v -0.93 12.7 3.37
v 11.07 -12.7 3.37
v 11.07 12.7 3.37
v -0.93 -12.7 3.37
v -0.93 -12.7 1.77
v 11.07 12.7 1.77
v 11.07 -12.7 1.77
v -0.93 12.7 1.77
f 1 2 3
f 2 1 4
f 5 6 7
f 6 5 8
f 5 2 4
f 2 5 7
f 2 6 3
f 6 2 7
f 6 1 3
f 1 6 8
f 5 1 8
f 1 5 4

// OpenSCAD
// file: ../usb-c-port.scad
//-----------------------------------------------------------------------
// USB-C port through a wall, flush: the socket's metal shell sits in a
// close-fitting pocket in the wall, walled in on all four sides, its face
// level with the outside. The cable seats the way it does on a laptop.
//
// A board's socket only overhangs the board edge by a mm or so, less than
// the wall. So the board's end tucks into a shallow relief in the wall's
// inner face, the width of the board, leaving the wall round the socket
// thin enough for the face to reach the outside. When that would leave less
// than usbcMinWall (a socket that barely overhangs), the face sits back from
// the outside instead: usbcRecess() says how far.
//
// Modules, all in the same frame:
//   usbcGhost()     the socket and the board's end, for previews
//   usbcWallCut()   subtract from the wall: socket pocket and board relief
//
// Frame: origin on the floor top at the wall's inner face, under the socket's
// axis. +X into the box, Z up. The wall is X = -wall .. 0. The board is
// component side up, socket on top (top-mount, as on the FireBeetle, C3 Super
// Mini and S3 DevKitC). Units: mm.
//
// usbcBoardEdgeX() gives where the board's edge lands (negative: inside the
// wall), so a holder can put its posts or pocket to match.
//-----------------------------------------------------------------------

//-- The socket: USB-C receptacle shell (USB-IF 8.34 x 2.56 plug, receptacle shell ~8.94 x 3.26)
usbcShellW     = 8.94;
usbcShellH     = 3.26;    // CAL per board: measured 3.2 on the FireBeetle
usbcShellR     = 1.2;     // CAL: end radius. Full round would be 1.63; most shells are squarer
usbcShellDepth = 7.35;    // face to back

//-- The pocket
usbcClearance  = 0.15;    // CAL: per side, shell to pocket. Set by the fit piece
usbcMinWall    = 1.0;     // thinnest wall left round the socket
usbcReliefGap  = 0.3;     // board relief over the board, each side and above/below
usbcChamfer    = 0.3;     // lead-in on the outside edge

//-- How far the socket face sits back from the outside: 0 (flush) unless the socket
//-- overhangs the board edge by less than usbcMinWall
function usbcRecess(overhang, minWall = usbcMinWall) = max(0, minWall - overhang);
//-- X of the board's socket edge in this frame
function usbcBoardEdgeX(wall, overhang, recess) =
  -wall + (is_undef(recess) ? usbcRecess(overhang) : recess) + overhang;
//-- Z of the board's underside above the floor top
function usbcBoardZ(axisZ, pcb, shellH = usbcShellH) = axisZ - shellH/2 - pcb;

module usbcShell2D(grow = 0, w = usbcShellW, h = usbcShellH, r = usbcShellR)
{
  offset(r = r + grow, $fn = 24) square([w - 2*r, h - 2*r], center = true);
}

//-- axisZ: socket axis above the floor. boardW/pcb: the board, for the ghost and relief.
//-- shift: socket centre across the board's width from the board's centre line (+Y)
module usbcGhost(axisZ, wall, overhang, boardW, pcb = 1.6, recess, shift = 0, shellH = usbcShellH, shellW = usbcShellW)
{
  ex = usbcBoardEdgeX(wall, overhang, recess);
  %color("Silver") translate([ex - overhang, 0, axisZ]) rotate([0, 90, 0]) rotate([0, 0, 90])
    linear_extrude(usbcShellDepth) usbcShell2D(w = shellW, h = shellH);
  %color("DarkSlateGray") translate([ex, -boardW/2 - shift, usbcBoardZ(axisZ, pcb, shellH)]) cube([12, boardW, pcb]);
}

module usbcWallCut(axisZ, wall, overhang, boardW, pcb = 1.6, recess, shift = 0,
                   clearance = usbcClearance, shellH = usbcShellH, shellW = usbcShellW, aboveBoard)
{
  rc = is_undef(recess) ? usbcRecess(overhang) : recess;
  ex = usbcBoardEdgeX(wall, overhang, rc);
  bz = usbcBoardZ(axisZ, pcb, shellH);
  //-- what stands on the board near its edge: the socket, unless told taller
  up = is_undef(aboveBoard) ? shellH : aboveBoard;
  assert(ex - overhang + wall >= -0.01, "socket face would stand proud of the wall");
  assert(rc > 0 || overhang >= usbcMinWall - 0.01, "wall round the socket under usbcMinWall");
  //-- socket pocket, through the wall
  translate([-wall - 1, 0, axisZ]) rotate([0, 90, 0]) rotate([0, 0, 90])
    linear_extrude(wall + 2) usbcShell2D(clearance, w = shellW, h = shellH);
  //-- lead-in chamfer on the outside
  translate([-wall, 0, axisZ]) rotate([0, 90, 0]) rotate([0, 0, 90])
    hull()
    {
      translate([0, 0, -0.01]) linear_extrude(0.01) usbcShell2D(clearance + usbcChamfer, w = shellW, h = shellH);
      translate([0, 0, usbcChamfer]) linear_extrude(0.01) usbcShell2D(clearance, w = shellW, h = shellH);
    }
  //-- board relief in the inner face, when the board's edge lands inside the wall
  if (ex < 0)
    translate([ex - usbcReliefGap, -boardW/2 - shift - usbcReliefGap, bz - usbcReliefGap])
      cube([-ex + usbcReliefGap + 1, boardW + 2*usbcReliefGap, pcb + up + 2*usbcReliefGap]);
}
// main file
include <../usb-c-port.scad>

wall = 2.4; overhang = 1.47; boardW = 25.4; pcb = 1.6; axisZ = 5;
ex = usbcBoardEdgeX(wall, overhang);
translate([ex, -boardW/2, usbcBoardZ(axisZ, pcb)]) cube([12, boardW, pcb]);
